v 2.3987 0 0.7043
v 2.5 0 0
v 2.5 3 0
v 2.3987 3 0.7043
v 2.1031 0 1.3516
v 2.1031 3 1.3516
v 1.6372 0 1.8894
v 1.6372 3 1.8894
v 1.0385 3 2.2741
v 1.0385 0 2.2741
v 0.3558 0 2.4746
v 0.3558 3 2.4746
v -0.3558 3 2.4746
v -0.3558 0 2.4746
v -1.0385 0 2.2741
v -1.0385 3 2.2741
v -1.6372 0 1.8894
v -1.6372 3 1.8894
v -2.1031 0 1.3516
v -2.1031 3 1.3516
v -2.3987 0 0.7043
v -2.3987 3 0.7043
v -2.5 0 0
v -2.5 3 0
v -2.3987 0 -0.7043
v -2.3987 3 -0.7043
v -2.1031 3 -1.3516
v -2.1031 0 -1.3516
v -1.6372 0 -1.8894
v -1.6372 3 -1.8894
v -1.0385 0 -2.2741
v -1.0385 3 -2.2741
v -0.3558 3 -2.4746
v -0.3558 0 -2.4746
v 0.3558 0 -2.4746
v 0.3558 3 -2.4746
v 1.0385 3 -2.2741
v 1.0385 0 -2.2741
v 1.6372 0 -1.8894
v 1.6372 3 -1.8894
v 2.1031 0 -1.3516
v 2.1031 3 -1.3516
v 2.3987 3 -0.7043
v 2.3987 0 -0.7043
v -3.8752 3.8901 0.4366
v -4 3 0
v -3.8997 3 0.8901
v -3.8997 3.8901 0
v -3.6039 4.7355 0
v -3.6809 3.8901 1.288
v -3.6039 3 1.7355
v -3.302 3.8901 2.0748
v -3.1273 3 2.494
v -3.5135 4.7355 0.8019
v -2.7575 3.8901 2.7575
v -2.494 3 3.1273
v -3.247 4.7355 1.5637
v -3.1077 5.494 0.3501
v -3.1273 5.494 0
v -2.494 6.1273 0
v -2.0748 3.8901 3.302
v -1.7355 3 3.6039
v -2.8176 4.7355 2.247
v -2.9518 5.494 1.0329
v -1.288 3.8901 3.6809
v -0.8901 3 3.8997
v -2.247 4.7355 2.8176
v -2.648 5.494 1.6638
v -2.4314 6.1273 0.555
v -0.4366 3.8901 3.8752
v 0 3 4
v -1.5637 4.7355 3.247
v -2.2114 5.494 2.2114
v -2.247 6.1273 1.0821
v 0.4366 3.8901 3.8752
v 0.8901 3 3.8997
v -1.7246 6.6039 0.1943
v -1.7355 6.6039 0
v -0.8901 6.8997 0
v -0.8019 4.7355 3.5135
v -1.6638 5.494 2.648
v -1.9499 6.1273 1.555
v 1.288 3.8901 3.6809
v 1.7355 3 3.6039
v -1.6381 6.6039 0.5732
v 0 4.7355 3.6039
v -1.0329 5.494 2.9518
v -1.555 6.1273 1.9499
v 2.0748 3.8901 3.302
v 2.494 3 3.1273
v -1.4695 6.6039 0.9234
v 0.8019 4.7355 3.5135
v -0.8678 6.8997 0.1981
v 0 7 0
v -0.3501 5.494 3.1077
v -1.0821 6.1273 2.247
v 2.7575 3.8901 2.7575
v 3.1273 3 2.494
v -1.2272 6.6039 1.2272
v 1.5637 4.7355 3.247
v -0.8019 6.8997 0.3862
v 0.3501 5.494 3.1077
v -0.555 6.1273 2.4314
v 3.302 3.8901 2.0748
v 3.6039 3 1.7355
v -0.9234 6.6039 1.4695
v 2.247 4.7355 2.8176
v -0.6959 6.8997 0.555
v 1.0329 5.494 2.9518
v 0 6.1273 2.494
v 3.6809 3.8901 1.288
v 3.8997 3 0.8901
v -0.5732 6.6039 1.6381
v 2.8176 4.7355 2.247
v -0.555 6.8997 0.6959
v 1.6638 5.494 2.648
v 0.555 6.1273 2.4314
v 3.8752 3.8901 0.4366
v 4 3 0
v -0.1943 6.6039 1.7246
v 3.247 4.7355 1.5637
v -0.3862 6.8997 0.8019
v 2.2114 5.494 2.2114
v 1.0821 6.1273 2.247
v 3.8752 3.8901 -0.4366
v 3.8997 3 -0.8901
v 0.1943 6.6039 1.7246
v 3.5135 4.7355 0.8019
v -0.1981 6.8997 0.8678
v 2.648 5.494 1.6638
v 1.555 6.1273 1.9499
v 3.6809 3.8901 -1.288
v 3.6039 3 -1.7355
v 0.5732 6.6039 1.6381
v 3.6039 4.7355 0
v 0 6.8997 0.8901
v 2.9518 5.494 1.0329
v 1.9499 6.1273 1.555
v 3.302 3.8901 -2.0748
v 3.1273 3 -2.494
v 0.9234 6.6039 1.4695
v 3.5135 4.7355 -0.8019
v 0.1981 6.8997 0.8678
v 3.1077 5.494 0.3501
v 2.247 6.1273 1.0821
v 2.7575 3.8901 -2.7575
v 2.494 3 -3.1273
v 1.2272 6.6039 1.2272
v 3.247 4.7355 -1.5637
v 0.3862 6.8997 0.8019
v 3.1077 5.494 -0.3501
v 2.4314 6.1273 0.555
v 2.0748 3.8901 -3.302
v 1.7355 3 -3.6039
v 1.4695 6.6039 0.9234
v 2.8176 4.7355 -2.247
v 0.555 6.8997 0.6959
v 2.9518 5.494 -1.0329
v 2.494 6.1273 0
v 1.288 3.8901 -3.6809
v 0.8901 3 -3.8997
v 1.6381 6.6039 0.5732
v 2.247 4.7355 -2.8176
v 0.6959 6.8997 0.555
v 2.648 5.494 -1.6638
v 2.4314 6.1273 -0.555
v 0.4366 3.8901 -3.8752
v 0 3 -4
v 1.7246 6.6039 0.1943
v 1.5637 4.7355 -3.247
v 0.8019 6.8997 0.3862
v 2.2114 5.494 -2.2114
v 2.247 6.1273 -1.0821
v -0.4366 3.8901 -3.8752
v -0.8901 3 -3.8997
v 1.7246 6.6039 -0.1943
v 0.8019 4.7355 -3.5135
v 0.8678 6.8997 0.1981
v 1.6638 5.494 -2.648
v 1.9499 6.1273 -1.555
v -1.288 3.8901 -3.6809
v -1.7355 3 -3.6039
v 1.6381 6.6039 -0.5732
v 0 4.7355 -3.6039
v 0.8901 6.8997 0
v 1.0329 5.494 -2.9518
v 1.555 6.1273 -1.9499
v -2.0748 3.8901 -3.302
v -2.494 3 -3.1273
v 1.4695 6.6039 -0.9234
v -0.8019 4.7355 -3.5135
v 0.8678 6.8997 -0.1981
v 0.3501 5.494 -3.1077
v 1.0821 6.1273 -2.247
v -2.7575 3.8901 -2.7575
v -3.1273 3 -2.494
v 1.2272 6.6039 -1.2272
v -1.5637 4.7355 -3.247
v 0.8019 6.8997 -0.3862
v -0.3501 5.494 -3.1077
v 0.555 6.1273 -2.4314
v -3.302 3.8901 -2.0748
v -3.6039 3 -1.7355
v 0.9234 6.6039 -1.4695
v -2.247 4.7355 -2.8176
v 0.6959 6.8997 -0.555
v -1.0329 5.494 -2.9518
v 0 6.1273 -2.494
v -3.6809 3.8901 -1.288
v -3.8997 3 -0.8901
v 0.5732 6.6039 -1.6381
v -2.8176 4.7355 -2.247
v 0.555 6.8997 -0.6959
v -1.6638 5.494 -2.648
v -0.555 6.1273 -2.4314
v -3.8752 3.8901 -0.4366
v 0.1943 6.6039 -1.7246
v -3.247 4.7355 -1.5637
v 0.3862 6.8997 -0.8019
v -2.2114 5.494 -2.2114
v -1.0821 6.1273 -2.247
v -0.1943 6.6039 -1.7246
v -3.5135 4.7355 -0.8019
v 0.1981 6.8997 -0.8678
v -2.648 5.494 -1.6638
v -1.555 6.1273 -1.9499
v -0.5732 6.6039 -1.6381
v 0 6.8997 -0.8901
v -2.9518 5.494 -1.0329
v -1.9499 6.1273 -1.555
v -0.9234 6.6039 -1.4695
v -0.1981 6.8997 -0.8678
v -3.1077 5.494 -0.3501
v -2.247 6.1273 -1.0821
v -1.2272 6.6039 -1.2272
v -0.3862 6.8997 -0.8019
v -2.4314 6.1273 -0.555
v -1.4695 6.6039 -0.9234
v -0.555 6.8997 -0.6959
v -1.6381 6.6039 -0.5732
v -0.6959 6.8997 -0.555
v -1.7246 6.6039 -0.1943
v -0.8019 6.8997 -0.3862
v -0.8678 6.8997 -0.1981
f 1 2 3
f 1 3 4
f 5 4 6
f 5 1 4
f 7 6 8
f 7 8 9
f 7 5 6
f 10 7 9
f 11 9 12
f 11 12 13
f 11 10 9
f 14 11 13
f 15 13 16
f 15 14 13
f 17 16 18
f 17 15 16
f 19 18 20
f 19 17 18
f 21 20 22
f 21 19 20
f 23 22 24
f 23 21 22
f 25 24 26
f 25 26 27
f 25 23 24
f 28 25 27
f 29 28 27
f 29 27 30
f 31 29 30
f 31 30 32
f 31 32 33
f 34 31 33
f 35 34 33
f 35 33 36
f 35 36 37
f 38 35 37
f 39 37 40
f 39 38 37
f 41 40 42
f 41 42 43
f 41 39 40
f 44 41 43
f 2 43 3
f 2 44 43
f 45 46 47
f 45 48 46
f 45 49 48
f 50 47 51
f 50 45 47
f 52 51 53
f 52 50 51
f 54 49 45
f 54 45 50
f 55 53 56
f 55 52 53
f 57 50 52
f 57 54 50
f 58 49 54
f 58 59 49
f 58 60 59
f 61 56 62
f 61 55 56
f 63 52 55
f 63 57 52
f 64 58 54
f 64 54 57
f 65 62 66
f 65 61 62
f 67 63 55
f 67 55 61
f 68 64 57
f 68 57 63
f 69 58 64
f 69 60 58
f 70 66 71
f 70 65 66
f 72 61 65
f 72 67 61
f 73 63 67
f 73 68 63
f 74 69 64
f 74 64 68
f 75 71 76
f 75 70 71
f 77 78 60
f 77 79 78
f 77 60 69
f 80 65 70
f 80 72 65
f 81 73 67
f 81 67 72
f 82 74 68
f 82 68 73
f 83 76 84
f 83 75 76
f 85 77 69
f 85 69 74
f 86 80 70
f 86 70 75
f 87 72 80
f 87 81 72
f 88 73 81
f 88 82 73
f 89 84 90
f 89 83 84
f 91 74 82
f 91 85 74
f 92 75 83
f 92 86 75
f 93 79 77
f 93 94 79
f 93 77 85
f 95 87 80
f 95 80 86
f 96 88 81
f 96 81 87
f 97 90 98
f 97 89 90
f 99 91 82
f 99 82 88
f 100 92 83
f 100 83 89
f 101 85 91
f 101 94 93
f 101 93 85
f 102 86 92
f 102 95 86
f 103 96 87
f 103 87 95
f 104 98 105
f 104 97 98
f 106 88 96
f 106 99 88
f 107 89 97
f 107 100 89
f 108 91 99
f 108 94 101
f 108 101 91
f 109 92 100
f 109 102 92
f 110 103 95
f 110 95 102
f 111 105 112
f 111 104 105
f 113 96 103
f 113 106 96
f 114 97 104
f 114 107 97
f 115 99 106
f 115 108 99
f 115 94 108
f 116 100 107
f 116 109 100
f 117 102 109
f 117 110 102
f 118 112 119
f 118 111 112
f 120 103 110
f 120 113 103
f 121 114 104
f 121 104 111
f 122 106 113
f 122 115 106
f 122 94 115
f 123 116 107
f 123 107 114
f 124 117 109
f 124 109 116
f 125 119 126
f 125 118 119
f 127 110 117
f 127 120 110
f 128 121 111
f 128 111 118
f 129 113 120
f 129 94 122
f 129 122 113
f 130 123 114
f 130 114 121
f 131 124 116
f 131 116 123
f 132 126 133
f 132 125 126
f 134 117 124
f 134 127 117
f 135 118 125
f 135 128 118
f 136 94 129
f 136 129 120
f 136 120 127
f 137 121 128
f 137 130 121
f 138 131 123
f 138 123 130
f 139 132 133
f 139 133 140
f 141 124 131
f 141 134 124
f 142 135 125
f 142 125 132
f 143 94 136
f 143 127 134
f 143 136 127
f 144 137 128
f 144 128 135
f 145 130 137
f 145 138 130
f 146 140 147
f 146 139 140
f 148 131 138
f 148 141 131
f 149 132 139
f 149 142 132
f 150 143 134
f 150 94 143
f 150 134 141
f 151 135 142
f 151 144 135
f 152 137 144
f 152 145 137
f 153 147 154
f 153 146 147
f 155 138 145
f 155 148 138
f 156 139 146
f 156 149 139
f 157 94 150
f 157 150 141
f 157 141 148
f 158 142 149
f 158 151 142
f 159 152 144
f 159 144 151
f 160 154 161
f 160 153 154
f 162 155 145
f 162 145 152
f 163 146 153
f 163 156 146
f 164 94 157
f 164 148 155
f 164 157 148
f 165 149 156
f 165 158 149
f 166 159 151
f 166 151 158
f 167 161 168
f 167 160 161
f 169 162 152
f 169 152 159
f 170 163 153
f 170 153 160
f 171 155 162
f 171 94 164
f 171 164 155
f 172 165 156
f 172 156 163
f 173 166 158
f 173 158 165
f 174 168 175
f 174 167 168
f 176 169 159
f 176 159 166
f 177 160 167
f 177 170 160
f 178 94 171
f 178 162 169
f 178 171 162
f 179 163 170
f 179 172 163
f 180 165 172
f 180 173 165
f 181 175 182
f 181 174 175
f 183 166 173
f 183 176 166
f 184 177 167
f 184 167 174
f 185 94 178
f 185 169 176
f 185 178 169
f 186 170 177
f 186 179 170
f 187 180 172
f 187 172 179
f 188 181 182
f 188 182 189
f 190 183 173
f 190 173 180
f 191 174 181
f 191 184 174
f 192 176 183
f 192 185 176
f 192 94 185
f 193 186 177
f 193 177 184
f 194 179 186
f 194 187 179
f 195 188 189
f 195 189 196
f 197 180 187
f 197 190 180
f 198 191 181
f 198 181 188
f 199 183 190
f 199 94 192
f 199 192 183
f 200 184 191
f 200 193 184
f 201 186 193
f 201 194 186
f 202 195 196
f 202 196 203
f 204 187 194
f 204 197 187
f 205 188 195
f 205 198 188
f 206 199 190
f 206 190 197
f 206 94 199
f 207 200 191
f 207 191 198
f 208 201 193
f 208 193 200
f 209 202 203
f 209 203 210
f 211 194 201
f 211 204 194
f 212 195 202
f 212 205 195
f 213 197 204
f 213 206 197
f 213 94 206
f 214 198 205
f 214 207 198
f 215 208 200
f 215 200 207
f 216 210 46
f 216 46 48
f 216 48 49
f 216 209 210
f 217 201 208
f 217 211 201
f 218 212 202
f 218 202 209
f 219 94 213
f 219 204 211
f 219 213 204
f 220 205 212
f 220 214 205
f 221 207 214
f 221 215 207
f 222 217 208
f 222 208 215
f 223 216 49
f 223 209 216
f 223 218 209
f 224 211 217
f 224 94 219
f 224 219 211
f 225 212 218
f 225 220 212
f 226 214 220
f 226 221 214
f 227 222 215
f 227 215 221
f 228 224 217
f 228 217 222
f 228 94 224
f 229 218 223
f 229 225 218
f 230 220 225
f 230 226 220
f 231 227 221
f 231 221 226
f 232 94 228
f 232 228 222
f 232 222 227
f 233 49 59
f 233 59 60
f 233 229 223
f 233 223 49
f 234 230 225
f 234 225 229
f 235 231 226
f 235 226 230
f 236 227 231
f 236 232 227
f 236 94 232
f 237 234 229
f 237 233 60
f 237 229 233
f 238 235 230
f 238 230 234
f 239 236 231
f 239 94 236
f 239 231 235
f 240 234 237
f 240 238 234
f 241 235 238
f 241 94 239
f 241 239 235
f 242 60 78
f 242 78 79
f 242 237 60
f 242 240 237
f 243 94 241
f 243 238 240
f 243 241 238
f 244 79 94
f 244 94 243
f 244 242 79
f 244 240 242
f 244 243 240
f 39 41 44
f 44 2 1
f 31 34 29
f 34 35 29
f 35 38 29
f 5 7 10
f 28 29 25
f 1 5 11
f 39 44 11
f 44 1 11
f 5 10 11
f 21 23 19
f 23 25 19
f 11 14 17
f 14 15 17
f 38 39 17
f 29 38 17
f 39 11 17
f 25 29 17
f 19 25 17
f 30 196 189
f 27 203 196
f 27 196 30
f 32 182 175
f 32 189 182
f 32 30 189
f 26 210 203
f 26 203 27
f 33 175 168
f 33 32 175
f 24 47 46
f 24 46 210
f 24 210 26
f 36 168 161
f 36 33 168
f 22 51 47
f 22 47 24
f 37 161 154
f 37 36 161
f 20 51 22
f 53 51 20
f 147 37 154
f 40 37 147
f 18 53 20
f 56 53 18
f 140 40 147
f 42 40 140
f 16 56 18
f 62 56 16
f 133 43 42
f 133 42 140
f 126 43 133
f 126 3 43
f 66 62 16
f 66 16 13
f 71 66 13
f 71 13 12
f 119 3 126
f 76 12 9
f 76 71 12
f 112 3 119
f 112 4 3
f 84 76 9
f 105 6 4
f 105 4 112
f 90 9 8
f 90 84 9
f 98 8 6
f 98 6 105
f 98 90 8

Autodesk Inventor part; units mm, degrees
ref_plane "YZ Plane" through (0, 0, 0) normal (1, 0, 0) x (0, 1, 0)
ref_plane "XZ Plane" through (0, 0, 0) normal (0, 1, 0) x (-1, 0, 0)
ref_plane "XY Plane" through (0, 0, 0) normal (0, 0, 1) x (1, 0, 0)
sketch "Szkic1" plane through (0, 0, 0) normal (0, 1, 0) x (-1, 0, 0)
  circle A0 centre (0, 0) radius 4
  dimension "d0" = 8
extrude "Wyciągnięcie proste1" add sketch "Szkic1" along normal blind 7
fillet "Zaokrąglenie1" radius 4 1 edges at (4, 7, 0)
sketch "Szkic2" plane through (0, 0, 0) normal (0, -1, 0) x (1, 0, 0)
  circle A0 centre (0, 0) radius 2.5
  circle A1 centre (0, 0) radius 4
  dimension "d4" = 5
  dimension "d5" = 8
extrude "Wyciągnięcie proste2" cut sketch "Szkic2" against normal blind 3
properties part number "GumoweTrzymadlo" material "Tworzywo sztuczne PET"
